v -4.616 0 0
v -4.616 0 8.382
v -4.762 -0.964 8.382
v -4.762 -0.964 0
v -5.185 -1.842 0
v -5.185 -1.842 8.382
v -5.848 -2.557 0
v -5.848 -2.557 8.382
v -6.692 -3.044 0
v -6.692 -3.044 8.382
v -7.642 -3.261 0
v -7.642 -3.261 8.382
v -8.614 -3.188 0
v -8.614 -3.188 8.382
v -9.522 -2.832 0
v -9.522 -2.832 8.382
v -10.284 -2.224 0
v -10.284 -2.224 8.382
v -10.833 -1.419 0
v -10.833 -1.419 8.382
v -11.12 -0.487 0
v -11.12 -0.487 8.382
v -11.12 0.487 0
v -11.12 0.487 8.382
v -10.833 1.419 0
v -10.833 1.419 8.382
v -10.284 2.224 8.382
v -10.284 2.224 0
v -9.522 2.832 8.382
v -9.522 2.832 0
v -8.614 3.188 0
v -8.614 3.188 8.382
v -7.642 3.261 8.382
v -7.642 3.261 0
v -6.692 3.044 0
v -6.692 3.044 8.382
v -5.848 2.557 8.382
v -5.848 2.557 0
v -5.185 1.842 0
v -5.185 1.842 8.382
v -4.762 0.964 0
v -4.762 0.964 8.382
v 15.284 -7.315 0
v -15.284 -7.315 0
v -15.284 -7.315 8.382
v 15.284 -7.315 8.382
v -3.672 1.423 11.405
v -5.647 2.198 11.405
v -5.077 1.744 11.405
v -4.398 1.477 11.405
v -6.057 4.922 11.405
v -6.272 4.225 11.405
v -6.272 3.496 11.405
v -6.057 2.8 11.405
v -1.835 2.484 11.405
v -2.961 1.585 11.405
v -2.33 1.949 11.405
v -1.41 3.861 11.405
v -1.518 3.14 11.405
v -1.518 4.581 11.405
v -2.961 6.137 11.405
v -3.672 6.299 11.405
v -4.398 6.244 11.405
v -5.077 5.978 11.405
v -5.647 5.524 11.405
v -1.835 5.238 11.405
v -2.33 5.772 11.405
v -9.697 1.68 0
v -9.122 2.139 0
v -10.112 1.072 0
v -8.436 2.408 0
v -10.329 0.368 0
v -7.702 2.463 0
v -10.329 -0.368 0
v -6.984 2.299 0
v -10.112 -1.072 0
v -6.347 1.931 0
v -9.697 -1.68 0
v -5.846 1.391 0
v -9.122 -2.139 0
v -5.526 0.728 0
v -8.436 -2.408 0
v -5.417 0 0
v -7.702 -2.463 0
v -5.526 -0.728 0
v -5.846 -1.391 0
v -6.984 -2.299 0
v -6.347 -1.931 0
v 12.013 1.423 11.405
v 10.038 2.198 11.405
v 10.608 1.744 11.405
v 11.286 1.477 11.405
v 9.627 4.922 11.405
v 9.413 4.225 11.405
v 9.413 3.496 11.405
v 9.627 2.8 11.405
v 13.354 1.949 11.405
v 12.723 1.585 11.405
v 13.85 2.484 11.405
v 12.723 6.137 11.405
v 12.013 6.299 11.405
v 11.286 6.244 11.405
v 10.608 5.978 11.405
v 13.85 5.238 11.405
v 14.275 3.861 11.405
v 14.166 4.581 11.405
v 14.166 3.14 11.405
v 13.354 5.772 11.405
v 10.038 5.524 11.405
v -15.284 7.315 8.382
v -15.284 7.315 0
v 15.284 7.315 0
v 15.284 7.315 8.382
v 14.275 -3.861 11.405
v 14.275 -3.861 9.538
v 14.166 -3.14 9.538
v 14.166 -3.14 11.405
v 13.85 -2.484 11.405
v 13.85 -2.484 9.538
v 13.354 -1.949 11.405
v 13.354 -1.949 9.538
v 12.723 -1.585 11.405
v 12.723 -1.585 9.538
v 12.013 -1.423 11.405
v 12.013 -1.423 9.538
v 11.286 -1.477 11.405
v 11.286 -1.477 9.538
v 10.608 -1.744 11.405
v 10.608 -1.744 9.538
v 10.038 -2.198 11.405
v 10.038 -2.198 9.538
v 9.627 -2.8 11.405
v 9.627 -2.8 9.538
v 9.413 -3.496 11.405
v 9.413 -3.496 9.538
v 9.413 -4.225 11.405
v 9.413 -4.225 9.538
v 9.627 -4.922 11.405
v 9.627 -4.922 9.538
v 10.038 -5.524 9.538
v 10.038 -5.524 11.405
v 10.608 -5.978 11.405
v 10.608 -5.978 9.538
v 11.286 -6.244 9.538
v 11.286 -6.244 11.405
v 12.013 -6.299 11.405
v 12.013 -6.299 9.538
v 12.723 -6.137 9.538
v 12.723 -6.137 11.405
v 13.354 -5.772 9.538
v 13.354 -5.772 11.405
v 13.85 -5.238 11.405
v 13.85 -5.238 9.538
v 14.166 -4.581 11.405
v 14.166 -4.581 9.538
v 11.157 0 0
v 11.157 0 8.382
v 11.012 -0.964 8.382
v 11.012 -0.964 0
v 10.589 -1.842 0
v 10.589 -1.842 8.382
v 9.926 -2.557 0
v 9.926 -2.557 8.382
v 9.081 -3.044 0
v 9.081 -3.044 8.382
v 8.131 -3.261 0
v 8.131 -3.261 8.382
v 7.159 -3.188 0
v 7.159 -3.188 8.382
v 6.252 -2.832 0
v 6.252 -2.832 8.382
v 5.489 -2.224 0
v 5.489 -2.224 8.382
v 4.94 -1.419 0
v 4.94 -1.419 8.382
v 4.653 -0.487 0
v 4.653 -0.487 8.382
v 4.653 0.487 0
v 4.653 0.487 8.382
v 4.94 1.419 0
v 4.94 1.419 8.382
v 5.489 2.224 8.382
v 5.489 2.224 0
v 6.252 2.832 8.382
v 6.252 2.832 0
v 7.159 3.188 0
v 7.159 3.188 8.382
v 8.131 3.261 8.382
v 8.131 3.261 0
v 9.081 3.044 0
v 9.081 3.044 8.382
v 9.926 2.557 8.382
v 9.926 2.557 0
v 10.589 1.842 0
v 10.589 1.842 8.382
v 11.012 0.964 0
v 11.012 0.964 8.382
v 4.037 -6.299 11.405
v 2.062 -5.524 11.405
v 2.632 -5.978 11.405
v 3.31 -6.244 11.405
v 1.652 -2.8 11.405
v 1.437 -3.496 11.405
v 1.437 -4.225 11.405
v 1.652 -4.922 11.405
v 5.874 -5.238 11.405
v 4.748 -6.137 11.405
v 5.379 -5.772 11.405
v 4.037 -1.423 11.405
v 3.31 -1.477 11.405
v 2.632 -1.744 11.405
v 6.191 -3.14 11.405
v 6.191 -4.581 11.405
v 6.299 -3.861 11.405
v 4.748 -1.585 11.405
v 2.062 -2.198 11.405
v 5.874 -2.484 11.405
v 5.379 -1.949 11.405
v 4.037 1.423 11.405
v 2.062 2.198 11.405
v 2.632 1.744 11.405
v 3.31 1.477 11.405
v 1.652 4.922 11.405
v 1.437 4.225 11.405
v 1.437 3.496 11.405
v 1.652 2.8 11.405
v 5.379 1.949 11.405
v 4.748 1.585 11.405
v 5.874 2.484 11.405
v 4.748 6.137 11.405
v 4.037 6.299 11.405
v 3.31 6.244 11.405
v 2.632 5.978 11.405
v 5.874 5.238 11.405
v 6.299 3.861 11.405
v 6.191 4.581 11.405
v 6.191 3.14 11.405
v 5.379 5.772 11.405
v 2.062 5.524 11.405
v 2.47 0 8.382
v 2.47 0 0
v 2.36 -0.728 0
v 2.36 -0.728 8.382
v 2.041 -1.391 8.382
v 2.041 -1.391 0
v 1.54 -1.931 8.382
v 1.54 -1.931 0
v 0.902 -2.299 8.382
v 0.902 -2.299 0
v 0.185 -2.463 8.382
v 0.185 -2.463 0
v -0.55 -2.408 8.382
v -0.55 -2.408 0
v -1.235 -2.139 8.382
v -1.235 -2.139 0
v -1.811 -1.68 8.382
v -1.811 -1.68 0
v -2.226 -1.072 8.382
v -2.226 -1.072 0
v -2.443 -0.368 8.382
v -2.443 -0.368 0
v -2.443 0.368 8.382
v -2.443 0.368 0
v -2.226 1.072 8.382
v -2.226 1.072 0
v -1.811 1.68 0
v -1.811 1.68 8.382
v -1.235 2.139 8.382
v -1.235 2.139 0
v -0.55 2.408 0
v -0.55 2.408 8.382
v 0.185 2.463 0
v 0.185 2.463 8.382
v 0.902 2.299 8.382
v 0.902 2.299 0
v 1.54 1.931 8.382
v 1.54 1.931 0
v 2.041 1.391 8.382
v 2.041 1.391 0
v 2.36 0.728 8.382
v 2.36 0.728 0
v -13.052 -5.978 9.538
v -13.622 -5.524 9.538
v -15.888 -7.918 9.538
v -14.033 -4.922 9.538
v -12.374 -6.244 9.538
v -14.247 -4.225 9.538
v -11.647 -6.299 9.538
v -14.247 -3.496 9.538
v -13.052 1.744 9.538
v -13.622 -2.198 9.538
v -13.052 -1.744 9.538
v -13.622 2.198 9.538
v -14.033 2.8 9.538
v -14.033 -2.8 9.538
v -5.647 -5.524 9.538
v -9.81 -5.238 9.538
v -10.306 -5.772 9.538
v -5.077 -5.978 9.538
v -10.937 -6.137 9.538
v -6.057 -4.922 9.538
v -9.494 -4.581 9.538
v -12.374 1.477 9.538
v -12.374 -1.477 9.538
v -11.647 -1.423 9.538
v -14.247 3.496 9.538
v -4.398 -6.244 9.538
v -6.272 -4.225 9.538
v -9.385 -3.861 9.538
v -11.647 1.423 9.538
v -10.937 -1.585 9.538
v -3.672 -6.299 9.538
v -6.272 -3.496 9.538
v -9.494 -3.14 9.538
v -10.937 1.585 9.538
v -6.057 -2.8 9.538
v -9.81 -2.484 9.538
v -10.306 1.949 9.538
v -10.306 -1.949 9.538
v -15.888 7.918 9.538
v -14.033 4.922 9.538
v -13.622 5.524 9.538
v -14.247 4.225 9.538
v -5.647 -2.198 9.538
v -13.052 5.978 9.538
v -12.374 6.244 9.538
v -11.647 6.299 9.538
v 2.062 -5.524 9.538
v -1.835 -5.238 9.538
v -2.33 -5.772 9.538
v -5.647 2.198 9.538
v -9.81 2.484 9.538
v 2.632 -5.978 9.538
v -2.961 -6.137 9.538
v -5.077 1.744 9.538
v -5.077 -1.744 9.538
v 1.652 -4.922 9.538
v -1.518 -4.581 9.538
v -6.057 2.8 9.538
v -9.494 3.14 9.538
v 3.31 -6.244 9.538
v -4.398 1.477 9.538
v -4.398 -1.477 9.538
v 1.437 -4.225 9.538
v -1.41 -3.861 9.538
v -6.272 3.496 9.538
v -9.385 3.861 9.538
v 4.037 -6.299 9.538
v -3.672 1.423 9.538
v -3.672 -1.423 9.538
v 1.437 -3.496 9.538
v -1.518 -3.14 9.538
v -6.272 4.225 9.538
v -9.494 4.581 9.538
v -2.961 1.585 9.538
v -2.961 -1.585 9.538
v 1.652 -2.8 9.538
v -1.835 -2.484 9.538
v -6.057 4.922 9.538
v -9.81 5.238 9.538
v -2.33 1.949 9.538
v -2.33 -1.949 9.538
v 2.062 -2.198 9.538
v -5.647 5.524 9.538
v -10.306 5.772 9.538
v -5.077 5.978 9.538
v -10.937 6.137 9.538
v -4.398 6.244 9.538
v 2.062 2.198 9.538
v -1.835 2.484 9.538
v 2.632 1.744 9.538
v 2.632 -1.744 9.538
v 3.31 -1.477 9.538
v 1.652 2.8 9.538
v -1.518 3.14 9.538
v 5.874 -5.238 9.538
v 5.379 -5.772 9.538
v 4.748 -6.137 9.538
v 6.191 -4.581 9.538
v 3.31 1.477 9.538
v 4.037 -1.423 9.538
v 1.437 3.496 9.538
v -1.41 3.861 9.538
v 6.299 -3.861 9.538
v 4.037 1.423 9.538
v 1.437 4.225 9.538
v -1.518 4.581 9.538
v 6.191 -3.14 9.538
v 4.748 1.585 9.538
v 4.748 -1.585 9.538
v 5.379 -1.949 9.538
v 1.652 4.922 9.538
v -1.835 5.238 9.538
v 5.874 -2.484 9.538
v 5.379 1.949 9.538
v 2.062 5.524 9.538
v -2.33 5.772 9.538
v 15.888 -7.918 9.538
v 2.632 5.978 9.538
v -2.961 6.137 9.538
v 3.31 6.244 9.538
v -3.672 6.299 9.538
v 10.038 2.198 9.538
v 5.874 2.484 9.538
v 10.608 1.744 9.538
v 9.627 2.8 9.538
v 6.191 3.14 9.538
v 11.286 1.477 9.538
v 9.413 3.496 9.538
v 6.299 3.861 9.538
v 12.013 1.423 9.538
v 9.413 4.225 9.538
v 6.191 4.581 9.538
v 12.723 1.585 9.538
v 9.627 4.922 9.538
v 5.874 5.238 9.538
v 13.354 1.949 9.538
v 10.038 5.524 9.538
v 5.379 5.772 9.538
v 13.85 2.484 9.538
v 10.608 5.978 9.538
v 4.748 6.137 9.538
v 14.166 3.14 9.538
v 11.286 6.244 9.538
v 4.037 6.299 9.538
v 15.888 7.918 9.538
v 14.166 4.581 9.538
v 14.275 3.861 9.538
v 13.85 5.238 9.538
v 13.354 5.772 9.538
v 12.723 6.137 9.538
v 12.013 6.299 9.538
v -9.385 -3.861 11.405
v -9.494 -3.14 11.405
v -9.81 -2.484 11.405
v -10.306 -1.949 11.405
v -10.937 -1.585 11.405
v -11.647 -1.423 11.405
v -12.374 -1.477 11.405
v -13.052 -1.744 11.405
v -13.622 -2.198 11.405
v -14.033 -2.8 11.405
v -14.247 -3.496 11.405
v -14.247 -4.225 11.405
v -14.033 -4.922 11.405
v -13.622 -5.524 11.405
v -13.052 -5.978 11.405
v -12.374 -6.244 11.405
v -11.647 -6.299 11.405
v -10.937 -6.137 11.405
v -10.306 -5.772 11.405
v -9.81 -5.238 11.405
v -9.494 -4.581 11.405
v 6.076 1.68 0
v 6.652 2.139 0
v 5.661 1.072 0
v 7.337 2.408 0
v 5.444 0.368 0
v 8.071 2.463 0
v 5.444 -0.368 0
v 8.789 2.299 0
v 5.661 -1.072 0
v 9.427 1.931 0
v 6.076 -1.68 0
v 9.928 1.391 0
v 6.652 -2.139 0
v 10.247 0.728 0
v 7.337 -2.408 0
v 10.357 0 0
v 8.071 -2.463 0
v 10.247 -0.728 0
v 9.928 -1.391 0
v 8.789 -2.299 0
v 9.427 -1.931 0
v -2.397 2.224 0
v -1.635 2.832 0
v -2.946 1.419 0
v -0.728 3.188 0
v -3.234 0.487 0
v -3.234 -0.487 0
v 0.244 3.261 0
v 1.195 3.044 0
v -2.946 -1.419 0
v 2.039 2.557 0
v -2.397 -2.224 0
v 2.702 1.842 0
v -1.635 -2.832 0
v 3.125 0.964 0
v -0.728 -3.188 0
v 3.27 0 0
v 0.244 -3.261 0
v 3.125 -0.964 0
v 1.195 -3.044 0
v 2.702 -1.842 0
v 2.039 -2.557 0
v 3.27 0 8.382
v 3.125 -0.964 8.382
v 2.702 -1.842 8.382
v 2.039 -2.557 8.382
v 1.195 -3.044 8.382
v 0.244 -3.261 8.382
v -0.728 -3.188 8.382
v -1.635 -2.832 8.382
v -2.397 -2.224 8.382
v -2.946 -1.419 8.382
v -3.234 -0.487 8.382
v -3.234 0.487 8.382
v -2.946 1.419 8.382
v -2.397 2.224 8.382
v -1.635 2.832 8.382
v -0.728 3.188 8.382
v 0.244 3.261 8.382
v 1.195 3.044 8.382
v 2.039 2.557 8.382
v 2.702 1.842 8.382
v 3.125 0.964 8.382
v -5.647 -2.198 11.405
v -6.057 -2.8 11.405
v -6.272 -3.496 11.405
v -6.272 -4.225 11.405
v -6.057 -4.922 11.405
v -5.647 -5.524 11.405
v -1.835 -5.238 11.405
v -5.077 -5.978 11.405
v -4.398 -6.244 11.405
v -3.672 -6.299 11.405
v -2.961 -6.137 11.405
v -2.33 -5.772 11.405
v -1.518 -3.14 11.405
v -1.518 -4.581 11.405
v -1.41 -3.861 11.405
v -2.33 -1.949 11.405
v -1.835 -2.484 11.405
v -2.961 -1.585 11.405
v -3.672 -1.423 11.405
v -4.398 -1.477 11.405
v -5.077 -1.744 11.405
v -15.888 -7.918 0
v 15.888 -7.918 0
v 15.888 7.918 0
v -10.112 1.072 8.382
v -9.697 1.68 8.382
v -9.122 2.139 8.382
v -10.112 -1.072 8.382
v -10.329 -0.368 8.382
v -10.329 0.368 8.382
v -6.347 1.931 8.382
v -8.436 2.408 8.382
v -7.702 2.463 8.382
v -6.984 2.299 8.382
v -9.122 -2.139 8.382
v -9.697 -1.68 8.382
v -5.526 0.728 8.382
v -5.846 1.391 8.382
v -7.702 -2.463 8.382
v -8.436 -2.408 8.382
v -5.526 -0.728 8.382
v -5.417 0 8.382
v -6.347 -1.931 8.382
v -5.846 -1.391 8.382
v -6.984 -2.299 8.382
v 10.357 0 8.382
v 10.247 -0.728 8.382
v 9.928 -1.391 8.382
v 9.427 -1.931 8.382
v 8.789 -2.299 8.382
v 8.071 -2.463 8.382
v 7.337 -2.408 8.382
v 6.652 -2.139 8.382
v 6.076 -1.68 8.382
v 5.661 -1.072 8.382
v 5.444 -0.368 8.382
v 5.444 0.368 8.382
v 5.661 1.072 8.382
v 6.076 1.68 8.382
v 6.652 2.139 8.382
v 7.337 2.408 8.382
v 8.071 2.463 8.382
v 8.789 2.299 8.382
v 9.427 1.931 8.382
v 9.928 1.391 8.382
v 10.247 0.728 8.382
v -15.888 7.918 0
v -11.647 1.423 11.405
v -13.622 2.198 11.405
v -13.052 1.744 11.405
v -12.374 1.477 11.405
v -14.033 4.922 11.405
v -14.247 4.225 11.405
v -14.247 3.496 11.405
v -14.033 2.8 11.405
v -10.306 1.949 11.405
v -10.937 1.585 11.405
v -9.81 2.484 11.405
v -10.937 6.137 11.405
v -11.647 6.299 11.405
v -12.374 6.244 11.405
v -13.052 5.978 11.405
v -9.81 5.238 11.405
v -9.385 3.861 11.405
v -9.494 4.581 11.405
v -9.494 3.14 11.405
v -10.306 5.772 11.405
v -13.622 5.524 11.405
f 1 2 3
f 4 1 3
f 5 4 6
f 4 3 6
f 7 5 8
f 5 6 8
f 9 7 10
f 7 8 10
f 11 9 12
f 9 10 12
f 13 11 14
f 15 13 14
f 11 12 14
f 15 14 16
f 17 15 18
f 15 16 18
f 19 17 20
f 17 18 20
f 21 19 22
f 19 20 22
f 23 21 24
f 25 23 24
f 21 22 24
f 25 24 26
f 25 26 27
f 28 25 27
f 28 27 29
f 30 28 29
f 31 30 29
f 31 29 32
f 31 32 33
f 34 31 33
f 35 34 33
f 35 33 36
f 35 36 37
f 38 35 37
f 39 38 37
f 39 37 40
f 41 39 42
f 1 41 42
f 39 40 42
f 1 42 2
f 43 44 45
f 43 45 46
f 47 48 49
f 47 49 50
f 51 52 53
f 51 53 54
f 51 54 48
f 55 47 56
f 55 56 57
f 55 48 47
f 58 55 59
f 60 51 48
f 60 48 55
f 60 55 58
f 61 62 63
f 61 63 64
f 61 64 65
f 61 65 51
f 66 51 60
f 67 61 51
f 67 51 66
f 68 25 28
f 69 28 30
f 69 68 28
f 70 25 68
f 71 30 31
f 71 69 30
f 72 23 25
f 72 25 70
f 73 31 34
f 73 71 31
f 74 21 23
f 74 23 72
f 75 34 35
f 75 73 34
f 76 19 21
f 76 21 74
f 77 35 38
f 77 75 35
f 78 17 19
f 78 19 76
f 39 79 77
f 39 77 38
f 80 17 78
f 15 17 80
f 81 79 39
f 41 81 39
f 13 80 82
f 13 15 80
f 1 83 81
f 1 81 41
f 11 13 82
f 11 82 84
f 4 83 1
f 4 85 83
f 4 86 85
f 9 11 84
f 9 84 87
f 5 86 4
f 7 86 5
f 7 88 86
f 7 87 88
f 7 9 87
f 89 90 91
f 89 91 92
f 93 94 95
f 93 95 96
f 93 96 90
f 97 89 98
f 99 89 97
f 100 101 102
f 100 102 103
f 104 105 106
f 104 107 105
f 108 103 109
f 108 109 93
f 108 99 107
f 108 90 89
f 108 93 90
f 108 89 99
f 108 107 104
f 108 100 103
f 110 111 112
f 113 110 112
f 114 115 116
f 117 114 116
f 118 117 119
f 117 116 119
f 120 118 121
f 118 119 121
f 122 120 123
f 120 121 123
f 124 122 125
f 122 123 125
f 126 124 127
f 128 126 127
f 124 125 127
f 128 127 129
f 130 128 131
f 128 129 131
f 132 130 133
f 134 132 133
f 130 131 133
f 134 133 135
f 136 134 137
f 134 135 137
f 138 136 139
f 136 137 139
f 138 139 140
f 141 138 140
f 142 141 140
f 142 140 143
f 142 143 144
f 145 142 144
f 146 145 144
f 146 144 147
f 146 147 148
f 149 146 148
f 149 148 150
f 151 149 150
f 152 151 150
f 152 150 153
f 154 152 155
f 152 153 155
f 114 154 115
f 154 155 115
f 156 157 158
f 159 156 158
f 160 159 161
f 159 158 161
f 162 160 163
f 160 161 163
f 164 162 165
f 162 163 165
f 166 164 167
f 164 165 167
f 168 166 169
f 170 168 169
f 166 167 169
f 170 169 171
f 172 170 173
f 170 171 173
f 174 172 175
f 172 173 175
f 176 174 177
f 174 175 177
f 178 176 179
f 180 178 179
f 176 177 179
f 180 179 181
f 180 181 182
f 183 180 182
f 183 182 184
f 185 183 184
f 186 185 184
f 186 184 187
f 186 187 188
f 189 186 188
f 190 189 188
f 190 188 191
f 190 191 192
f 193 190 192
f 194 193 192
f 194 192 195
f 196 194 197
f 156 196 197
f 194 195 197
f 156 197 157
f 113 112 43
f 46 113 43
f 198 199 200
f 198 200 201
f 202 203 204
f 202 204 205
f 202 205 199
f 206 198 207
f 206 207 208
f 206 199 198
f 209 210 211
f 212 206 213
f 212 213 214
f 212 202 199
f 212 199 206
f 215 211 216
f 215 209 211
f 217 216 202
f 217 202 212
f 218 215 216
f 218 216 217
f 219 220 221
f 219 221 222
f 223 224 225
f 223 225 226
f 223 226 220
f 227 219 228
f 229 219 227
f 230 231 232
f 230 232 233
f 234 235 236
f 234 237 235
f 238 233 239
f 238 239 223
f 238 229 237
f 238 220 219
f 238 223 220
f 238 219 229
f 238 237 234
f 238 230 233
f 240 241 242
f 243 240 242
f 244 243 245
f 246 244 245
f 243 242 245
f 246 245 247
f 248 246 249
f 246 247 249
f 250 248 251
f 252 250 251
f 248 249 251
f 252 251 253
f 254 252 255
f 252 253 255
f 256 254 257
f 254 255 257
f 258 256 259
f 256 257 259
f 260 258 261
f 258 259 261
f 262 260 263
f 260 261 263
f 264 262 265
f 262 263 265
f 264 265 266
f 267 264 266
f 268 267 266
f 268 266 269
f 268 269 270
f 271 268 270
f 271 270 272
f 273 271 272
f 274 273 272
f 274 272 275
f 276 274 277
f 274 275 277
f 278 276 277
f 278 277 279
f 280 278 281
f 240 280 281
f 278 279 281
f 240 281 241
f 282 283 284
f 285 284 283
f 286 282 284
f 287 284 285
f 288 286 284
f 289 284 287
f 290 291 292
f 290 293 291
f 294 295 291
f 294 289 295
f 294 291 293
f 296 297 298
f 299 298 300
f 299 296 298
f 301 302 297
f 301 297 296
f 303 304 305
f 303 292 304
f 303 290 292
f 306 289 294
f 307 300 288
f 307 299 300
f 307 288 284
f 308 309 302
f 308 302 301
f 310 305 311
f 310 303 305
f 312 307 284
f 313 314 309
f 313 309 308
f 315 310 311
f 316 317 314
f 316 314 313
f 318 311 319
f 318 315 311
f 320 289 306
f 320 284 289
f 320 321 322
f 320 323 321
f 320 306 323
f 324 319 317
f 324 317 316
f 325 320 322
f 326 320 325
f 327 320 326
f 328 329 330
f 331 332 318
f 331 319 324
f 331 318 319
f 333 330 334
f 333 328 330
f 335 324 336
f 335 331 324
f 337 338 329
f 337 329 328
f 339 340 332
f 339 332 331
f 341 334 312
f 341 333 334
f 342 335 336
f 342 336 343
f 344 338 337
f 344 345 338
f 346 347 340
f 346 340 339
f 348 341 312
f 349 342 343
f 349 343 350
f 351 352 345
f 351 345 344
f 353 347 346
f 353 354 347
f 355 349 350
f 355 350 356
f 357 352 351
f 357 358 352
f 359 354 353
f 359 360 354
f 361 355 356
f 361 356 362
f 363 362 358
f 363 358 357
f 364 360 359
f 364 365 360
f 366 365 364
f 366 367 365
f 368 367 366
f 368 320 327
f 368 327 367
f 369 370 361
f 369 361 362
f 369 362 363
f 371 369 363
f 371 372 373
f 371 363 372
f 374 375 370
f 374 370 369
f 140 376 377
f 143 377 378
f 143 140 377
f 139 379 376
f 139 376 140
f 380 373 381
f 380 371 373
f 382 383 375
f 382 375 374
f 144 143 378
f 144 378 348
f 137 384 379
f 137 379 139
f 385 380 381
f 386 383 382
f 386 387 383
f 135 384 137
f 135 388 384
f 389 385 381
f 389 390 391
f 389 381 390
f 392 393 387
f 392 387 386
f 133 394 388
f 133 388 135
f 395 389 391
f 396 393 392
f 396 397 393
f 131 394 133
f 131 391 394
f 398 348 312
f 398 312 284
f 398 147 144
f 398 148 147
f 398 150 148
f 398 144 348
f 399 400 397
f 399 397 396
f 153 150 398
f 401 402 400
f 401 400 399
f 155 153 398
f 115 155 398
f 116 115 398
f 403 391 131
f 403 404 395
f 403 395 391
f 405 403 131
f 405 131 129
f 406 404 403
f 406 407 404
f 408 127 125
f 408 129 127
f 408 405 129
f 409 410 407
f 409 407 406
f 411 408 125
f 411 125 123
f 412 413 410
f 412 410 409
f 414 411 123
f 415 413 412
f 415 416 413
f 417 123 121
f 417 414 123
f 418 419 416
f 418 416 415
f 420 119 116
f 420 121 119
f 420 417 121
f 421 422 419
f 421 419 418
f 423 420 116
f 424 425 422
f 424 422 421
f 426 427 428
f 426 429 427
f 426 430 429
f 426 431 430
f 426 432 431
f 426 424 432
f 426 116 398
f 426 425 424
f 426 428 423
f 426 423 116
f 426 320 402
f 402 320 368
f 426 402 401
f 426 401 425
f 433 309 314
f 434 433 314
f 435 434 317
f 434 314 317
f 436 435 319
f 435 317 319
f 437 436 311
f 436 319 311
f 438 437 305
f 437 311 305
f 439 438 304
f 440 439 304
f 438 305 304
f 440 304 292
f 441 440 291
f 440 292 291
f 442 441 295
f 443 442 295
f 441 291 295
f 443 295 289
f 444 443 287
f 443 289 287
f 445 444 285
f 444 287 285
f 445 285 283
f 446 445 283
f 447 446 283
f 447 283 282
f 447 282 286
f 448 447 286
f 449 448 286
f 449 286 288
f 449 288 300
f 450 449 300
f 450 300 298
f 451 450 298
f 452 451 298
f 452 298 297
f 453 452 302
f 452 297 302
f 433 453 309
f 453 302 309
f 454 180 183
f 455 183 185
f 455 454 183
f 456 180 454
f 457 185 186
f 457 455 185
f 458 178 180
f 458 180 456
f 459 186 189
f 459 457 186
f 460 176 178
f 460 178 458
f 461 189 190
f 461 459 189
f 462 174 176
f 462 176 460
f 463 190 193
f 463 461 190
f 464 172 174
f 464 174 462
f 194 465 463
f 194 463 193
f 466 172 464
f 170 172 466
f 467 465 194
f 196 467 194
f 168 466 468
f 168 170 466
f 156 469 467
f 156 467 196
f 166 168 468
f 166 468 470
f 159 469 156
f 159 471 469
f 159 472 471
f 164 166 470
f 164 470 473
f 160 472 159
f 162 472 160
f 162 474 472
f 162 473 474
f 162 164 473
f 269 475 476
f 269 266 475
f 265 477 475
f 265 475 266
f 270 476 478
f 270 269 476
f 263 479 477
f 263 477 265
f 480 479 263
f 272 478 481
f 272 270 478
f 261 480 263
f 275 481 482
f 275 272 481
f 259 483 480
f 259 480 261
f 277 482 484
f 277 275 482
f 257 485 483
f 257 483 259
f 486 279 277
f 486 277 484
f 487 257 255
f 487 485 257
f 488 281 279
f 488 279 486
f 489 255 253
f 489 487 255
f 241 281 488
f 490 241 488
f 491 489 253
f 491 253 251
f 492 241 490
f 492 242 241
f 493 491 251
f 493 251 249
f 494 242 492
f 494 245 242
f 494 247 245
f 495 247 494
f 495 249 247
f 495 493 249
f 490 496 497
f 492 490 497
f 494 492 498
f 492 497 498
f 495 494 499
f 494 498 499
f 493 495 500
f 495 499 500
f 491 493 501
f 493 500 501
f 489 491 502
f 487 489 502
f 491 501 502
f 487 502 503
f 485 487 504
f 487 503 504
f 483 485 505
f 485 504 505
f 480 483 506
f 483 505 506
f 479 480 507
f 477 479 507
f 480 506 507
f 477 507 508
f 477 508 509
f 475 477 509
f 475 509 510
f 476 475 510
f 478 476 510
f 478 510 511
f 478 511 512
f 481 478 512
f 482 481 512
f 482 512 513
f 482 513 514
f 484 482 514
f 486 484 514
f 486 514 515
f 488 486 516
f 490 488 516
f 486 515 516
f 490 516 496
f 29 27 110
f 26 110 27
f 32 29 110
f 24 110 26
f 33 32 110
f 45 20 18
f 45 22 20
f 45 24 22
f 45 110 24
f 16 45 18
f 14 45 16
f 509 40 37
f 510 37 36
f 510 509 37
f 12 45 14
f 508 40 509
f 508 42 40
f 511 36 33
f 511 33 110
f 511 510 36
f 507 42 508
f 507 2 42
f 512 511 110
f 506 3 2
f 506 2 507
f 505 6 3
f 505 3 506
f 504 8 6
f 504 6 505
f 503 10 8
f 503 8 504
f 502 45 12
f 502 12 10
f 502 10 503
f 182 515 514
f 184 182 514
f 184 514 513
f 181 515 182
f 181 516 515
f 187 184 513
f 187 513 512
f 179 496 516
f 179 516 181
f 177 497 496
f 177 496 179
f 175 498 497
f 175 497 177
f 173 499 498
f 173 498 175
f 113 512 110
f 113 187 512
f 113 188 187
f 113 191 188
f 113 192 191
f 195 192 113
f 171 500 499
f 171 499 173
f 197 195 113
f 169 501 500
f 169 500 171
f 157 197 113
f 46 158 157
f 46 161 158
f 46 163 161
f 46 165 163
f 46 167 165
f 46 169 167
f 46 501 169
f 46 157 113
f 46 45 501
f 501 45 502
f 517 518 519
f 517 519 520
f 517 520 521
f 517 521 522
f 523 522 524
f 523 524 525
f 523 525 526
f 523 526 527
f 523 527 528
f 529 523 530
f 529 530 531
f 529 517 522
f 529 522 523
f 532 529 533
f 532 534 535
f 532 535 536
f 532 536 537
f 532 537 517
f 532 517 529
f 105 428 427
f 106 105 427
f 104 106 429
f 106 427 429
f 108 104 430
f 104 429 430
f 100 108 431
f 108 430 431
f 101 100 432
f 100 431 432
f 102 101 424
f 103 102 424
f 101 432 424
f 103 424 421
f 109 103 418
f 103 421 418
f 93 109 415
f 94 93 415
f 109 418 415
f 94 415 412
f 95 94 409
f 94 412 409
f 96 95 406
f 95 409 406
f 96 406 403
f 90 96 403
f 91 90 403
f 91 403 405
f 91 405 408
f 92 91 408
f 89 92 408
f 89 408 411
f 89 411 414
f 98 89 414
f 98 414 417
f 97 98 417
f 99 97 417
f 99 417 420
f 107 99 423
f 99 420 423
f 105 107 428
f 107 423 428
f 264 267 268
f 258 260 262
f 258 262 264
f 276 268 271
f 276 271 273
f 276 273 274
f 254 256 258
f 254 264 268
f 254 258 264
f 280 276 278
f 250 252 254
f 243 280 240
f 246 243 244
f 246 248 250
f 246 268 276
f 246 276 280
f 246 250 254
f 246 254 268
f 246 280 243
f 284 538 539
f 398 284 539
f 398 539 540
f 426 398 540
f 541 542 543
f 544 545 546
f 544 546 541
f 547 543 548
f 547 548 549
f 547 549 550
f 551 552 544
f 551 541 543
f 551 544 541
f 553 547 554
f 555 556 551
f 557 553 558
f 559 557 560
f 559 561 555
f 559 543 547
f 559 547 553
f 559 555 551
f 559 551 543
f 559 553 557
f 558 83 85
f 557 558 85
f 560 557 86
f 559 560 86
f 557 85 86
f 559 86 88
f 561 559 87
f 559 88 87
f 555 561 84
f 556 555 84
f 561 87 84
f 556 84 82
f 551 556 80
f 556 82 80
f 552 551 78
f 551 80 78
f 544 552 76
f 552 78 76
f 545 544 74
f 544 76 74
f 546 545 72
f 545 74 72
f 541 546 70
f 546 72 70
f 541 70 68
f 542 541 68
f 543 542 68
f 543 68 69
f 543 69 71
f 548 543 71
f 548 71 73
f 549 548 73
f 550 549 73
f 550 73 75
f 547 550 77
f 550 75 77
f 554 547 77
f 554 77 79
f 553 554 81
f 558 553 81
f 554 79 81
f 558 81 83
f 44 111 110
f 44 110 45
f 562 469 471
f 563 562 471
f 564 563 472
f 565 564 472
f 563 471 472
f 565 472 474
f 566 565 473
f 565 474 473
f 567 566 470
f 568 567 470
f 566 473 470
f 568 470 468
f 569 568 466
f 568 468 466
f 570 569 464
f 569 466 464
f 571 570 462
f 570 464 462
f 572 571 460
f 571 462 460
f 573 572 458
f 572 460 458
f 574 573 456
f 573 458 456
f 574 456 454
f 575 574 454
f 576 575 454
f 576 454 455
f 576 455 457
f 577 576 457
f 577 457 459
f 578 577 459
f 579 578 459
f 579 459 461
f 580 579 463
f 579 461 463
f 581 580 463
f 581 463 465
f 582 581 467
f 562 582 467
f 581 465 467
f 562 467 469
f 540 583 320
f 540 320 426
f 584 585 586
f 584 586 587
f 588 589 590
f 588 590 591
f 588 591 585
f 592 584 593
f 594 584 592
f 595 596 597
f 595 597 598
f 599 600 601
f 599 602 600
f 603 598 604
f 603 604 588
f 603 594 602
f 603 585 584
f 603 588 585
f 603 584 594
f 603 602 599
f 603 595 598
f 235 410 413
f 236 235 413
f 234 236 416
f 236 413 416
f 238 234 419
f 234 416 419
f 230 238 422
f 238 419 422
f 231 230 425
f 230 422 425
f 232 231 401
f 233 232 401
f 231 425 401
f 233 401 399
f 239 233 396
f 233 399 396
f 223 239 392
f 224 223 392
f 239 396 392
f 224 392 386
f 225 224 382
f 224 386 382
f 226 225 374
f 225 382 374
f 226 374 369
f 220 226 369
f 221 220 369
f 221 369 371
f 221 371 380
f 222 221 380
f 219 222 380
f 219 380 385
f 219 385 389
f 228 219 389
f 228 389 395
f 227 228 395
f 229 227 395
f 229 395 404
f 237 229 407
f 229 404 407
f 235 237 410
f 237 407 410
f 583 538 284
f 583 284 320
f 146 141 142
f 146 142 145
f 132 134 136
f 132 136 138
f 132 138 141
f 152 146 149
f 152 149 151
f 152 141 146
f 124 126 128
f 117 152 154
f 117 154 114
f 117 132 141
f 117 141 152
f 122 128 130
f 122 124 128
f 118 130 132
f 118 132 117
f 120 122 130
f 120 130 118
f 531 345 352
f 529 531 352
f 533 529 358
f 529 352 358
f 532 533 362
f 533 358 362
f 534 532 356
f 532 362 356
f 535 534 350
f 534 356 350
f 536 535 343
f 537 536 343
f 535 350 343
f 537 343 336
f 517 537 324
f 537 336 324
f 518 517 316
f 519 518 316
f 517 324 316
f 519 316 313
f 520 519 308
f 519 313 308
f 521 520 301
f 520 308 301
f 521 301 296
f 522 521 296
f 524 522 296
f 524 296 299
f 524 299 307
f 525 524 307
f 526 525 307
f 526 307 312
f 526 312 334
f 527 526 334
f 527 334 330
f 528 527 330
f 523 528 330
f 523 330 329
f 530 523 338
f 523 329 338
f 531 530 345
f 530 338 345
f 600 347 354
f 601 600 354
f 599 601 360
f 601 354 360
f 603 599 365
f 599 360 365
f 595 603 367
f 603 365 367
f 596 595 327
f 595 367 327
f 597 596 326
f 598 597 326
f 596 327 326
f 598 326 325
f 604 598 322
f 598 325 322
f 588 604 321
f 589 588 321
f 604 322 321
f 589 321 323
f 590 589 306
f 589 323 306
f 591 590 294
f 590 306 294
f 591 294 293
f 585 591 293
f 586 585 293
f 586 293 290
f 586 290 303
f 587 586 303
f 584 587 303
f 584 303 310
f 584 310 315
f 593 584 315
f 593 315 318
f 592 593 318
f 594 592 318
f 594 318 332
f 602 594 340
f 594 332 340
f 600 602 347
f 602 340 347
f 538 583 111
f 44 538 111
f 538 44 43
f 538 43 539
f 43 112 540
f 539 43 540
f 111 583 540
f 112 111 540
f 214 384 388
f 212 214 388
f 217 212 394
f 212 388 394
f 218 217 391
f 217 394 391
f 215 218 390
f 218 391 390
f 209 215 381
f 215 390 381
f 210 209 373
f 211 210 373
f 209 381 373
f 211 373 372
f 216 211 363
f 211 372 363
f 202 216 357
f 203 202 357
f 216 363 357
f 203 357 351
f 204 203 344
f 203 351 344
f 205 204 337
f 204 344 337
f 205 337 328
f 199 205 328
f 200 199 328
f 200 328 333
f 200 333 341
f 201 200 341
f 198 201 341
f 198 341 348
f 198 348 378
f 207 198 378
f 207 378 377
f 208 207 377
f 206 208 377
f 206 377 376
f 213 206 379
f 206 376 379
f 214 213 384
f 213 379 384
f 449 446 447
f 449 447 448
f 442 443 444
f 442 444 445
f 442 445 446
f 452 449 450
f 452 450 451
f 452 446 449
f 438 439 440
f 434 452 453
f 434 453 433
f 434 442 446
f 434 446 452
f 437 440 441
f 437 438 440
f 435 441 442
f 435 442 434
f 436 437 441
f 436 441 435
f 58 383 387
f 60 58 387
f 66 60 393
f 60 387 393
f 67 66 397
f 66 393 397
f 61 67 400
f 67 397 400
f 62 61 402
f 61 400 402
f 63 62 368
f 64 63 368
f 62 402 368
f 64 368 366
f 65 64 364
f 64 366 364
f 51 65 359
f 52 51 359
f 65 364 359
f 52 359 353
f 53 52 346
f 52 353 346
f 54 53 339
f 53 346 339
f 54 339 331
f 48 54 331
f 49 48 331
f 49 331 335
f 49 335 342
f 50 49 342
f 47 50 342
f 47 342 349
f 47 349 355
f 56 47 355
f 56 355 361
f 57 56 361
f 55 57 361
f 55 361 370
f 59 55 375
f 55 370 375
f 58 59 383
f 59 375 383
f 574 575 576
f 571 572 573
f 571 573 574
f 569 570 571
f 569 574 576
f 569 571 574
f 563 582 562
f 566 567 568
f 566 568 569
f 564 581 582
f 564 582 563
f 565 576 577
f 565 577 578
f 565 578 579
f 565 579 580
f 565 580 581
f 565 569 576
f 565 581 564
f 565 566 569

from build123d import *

# Parameters (mm, degrees)
F0_W      = 31.7754
F0_H      = 15.8369
F1_DEPTH  = 9.5377
F2_R      = 2.44475
F3_DEPTH  = 1.8669
F5_W      = 30.5689
F5_H      = 14.6304
F6_DEPTH  = 8.382
F7_R      = 3.27025
F8_DEPTH  = 8.382
F9_R      = 2.47015
F10_DEPTH = 8.382


with BuildPart() as f1:
    # F0 (on Top) → F1 (new body)
    with BuildSketch(Plane.XY):
        Rectangle(F0_W, F0_H)
    extrude(amount=F1_DEPTH)

    # F2 (on face) → F3 (join)
    with BuildSketch(Plane.XY.offset(9.5377)):
        with Locations((-11.83005, 3.8608)):
            Circle(F2_R)
        with Locations((-3.85445, 3.8608)):
            Circle(F2_R)
        with Locations((3.85445, 3.8608)):
            Circle(F2_R)
        with Locations((11.83005, 3.8608)):
            Circle(F2_R)
        with Locations((-11.83005, -3.8608)):
            Circle(F2_R)
        with Locations((-3.85445, -3.8608)):
            Circle(F2_R)
        with Locations((3.85445, -3.8608)):
            Circle(F2_R)
        with Locations((11.83005, -3.8608)):
            Circle(F2_R)
    extrude(amount=F3_DEPTH)

    # F5 (on plane+point) → F6 (cut)
    with BuildSketch(Plane(origin=(0, 0, 0), x_dir=(1, 0, 0), z_dir=(0, 0, -1))):
        Rectangle(F5_W, F5_H)
    extrude(amount=-F6_DEPTH, mode=Mode.SUBTRACT)

    # F7 (on face) → F8 (join)
    with BuildSketch(Plane(origin=(0, 0, 8.382), x_dir=(1, 0, 0), z_dir=(0, 0, -1))):
        with Locations((-7.8867, 0)):
            Circle(F7_R)
        Circle(F7_R)
        with Locations((7.8867, 0)):
            Circle(F7_R)
    extrude(amount=F8_DEPTH)

    # F9 (on face) → F10 (cut)
    with BuildSketch(Plane(origin=(0, 0, 0), x_dir=(1, 0, 0), z_dir=(0, 0, -1))):
        with Locations((-7.8867, 0)):
            Circle(F9_R)
        Circle(F9_R)
        with Locations((7.8867, 0)):
            Circle(F9_R)
    extrude(amount=-F10_DEPTH, mode=Mode.SUBTRACT)


solid = f1.part
